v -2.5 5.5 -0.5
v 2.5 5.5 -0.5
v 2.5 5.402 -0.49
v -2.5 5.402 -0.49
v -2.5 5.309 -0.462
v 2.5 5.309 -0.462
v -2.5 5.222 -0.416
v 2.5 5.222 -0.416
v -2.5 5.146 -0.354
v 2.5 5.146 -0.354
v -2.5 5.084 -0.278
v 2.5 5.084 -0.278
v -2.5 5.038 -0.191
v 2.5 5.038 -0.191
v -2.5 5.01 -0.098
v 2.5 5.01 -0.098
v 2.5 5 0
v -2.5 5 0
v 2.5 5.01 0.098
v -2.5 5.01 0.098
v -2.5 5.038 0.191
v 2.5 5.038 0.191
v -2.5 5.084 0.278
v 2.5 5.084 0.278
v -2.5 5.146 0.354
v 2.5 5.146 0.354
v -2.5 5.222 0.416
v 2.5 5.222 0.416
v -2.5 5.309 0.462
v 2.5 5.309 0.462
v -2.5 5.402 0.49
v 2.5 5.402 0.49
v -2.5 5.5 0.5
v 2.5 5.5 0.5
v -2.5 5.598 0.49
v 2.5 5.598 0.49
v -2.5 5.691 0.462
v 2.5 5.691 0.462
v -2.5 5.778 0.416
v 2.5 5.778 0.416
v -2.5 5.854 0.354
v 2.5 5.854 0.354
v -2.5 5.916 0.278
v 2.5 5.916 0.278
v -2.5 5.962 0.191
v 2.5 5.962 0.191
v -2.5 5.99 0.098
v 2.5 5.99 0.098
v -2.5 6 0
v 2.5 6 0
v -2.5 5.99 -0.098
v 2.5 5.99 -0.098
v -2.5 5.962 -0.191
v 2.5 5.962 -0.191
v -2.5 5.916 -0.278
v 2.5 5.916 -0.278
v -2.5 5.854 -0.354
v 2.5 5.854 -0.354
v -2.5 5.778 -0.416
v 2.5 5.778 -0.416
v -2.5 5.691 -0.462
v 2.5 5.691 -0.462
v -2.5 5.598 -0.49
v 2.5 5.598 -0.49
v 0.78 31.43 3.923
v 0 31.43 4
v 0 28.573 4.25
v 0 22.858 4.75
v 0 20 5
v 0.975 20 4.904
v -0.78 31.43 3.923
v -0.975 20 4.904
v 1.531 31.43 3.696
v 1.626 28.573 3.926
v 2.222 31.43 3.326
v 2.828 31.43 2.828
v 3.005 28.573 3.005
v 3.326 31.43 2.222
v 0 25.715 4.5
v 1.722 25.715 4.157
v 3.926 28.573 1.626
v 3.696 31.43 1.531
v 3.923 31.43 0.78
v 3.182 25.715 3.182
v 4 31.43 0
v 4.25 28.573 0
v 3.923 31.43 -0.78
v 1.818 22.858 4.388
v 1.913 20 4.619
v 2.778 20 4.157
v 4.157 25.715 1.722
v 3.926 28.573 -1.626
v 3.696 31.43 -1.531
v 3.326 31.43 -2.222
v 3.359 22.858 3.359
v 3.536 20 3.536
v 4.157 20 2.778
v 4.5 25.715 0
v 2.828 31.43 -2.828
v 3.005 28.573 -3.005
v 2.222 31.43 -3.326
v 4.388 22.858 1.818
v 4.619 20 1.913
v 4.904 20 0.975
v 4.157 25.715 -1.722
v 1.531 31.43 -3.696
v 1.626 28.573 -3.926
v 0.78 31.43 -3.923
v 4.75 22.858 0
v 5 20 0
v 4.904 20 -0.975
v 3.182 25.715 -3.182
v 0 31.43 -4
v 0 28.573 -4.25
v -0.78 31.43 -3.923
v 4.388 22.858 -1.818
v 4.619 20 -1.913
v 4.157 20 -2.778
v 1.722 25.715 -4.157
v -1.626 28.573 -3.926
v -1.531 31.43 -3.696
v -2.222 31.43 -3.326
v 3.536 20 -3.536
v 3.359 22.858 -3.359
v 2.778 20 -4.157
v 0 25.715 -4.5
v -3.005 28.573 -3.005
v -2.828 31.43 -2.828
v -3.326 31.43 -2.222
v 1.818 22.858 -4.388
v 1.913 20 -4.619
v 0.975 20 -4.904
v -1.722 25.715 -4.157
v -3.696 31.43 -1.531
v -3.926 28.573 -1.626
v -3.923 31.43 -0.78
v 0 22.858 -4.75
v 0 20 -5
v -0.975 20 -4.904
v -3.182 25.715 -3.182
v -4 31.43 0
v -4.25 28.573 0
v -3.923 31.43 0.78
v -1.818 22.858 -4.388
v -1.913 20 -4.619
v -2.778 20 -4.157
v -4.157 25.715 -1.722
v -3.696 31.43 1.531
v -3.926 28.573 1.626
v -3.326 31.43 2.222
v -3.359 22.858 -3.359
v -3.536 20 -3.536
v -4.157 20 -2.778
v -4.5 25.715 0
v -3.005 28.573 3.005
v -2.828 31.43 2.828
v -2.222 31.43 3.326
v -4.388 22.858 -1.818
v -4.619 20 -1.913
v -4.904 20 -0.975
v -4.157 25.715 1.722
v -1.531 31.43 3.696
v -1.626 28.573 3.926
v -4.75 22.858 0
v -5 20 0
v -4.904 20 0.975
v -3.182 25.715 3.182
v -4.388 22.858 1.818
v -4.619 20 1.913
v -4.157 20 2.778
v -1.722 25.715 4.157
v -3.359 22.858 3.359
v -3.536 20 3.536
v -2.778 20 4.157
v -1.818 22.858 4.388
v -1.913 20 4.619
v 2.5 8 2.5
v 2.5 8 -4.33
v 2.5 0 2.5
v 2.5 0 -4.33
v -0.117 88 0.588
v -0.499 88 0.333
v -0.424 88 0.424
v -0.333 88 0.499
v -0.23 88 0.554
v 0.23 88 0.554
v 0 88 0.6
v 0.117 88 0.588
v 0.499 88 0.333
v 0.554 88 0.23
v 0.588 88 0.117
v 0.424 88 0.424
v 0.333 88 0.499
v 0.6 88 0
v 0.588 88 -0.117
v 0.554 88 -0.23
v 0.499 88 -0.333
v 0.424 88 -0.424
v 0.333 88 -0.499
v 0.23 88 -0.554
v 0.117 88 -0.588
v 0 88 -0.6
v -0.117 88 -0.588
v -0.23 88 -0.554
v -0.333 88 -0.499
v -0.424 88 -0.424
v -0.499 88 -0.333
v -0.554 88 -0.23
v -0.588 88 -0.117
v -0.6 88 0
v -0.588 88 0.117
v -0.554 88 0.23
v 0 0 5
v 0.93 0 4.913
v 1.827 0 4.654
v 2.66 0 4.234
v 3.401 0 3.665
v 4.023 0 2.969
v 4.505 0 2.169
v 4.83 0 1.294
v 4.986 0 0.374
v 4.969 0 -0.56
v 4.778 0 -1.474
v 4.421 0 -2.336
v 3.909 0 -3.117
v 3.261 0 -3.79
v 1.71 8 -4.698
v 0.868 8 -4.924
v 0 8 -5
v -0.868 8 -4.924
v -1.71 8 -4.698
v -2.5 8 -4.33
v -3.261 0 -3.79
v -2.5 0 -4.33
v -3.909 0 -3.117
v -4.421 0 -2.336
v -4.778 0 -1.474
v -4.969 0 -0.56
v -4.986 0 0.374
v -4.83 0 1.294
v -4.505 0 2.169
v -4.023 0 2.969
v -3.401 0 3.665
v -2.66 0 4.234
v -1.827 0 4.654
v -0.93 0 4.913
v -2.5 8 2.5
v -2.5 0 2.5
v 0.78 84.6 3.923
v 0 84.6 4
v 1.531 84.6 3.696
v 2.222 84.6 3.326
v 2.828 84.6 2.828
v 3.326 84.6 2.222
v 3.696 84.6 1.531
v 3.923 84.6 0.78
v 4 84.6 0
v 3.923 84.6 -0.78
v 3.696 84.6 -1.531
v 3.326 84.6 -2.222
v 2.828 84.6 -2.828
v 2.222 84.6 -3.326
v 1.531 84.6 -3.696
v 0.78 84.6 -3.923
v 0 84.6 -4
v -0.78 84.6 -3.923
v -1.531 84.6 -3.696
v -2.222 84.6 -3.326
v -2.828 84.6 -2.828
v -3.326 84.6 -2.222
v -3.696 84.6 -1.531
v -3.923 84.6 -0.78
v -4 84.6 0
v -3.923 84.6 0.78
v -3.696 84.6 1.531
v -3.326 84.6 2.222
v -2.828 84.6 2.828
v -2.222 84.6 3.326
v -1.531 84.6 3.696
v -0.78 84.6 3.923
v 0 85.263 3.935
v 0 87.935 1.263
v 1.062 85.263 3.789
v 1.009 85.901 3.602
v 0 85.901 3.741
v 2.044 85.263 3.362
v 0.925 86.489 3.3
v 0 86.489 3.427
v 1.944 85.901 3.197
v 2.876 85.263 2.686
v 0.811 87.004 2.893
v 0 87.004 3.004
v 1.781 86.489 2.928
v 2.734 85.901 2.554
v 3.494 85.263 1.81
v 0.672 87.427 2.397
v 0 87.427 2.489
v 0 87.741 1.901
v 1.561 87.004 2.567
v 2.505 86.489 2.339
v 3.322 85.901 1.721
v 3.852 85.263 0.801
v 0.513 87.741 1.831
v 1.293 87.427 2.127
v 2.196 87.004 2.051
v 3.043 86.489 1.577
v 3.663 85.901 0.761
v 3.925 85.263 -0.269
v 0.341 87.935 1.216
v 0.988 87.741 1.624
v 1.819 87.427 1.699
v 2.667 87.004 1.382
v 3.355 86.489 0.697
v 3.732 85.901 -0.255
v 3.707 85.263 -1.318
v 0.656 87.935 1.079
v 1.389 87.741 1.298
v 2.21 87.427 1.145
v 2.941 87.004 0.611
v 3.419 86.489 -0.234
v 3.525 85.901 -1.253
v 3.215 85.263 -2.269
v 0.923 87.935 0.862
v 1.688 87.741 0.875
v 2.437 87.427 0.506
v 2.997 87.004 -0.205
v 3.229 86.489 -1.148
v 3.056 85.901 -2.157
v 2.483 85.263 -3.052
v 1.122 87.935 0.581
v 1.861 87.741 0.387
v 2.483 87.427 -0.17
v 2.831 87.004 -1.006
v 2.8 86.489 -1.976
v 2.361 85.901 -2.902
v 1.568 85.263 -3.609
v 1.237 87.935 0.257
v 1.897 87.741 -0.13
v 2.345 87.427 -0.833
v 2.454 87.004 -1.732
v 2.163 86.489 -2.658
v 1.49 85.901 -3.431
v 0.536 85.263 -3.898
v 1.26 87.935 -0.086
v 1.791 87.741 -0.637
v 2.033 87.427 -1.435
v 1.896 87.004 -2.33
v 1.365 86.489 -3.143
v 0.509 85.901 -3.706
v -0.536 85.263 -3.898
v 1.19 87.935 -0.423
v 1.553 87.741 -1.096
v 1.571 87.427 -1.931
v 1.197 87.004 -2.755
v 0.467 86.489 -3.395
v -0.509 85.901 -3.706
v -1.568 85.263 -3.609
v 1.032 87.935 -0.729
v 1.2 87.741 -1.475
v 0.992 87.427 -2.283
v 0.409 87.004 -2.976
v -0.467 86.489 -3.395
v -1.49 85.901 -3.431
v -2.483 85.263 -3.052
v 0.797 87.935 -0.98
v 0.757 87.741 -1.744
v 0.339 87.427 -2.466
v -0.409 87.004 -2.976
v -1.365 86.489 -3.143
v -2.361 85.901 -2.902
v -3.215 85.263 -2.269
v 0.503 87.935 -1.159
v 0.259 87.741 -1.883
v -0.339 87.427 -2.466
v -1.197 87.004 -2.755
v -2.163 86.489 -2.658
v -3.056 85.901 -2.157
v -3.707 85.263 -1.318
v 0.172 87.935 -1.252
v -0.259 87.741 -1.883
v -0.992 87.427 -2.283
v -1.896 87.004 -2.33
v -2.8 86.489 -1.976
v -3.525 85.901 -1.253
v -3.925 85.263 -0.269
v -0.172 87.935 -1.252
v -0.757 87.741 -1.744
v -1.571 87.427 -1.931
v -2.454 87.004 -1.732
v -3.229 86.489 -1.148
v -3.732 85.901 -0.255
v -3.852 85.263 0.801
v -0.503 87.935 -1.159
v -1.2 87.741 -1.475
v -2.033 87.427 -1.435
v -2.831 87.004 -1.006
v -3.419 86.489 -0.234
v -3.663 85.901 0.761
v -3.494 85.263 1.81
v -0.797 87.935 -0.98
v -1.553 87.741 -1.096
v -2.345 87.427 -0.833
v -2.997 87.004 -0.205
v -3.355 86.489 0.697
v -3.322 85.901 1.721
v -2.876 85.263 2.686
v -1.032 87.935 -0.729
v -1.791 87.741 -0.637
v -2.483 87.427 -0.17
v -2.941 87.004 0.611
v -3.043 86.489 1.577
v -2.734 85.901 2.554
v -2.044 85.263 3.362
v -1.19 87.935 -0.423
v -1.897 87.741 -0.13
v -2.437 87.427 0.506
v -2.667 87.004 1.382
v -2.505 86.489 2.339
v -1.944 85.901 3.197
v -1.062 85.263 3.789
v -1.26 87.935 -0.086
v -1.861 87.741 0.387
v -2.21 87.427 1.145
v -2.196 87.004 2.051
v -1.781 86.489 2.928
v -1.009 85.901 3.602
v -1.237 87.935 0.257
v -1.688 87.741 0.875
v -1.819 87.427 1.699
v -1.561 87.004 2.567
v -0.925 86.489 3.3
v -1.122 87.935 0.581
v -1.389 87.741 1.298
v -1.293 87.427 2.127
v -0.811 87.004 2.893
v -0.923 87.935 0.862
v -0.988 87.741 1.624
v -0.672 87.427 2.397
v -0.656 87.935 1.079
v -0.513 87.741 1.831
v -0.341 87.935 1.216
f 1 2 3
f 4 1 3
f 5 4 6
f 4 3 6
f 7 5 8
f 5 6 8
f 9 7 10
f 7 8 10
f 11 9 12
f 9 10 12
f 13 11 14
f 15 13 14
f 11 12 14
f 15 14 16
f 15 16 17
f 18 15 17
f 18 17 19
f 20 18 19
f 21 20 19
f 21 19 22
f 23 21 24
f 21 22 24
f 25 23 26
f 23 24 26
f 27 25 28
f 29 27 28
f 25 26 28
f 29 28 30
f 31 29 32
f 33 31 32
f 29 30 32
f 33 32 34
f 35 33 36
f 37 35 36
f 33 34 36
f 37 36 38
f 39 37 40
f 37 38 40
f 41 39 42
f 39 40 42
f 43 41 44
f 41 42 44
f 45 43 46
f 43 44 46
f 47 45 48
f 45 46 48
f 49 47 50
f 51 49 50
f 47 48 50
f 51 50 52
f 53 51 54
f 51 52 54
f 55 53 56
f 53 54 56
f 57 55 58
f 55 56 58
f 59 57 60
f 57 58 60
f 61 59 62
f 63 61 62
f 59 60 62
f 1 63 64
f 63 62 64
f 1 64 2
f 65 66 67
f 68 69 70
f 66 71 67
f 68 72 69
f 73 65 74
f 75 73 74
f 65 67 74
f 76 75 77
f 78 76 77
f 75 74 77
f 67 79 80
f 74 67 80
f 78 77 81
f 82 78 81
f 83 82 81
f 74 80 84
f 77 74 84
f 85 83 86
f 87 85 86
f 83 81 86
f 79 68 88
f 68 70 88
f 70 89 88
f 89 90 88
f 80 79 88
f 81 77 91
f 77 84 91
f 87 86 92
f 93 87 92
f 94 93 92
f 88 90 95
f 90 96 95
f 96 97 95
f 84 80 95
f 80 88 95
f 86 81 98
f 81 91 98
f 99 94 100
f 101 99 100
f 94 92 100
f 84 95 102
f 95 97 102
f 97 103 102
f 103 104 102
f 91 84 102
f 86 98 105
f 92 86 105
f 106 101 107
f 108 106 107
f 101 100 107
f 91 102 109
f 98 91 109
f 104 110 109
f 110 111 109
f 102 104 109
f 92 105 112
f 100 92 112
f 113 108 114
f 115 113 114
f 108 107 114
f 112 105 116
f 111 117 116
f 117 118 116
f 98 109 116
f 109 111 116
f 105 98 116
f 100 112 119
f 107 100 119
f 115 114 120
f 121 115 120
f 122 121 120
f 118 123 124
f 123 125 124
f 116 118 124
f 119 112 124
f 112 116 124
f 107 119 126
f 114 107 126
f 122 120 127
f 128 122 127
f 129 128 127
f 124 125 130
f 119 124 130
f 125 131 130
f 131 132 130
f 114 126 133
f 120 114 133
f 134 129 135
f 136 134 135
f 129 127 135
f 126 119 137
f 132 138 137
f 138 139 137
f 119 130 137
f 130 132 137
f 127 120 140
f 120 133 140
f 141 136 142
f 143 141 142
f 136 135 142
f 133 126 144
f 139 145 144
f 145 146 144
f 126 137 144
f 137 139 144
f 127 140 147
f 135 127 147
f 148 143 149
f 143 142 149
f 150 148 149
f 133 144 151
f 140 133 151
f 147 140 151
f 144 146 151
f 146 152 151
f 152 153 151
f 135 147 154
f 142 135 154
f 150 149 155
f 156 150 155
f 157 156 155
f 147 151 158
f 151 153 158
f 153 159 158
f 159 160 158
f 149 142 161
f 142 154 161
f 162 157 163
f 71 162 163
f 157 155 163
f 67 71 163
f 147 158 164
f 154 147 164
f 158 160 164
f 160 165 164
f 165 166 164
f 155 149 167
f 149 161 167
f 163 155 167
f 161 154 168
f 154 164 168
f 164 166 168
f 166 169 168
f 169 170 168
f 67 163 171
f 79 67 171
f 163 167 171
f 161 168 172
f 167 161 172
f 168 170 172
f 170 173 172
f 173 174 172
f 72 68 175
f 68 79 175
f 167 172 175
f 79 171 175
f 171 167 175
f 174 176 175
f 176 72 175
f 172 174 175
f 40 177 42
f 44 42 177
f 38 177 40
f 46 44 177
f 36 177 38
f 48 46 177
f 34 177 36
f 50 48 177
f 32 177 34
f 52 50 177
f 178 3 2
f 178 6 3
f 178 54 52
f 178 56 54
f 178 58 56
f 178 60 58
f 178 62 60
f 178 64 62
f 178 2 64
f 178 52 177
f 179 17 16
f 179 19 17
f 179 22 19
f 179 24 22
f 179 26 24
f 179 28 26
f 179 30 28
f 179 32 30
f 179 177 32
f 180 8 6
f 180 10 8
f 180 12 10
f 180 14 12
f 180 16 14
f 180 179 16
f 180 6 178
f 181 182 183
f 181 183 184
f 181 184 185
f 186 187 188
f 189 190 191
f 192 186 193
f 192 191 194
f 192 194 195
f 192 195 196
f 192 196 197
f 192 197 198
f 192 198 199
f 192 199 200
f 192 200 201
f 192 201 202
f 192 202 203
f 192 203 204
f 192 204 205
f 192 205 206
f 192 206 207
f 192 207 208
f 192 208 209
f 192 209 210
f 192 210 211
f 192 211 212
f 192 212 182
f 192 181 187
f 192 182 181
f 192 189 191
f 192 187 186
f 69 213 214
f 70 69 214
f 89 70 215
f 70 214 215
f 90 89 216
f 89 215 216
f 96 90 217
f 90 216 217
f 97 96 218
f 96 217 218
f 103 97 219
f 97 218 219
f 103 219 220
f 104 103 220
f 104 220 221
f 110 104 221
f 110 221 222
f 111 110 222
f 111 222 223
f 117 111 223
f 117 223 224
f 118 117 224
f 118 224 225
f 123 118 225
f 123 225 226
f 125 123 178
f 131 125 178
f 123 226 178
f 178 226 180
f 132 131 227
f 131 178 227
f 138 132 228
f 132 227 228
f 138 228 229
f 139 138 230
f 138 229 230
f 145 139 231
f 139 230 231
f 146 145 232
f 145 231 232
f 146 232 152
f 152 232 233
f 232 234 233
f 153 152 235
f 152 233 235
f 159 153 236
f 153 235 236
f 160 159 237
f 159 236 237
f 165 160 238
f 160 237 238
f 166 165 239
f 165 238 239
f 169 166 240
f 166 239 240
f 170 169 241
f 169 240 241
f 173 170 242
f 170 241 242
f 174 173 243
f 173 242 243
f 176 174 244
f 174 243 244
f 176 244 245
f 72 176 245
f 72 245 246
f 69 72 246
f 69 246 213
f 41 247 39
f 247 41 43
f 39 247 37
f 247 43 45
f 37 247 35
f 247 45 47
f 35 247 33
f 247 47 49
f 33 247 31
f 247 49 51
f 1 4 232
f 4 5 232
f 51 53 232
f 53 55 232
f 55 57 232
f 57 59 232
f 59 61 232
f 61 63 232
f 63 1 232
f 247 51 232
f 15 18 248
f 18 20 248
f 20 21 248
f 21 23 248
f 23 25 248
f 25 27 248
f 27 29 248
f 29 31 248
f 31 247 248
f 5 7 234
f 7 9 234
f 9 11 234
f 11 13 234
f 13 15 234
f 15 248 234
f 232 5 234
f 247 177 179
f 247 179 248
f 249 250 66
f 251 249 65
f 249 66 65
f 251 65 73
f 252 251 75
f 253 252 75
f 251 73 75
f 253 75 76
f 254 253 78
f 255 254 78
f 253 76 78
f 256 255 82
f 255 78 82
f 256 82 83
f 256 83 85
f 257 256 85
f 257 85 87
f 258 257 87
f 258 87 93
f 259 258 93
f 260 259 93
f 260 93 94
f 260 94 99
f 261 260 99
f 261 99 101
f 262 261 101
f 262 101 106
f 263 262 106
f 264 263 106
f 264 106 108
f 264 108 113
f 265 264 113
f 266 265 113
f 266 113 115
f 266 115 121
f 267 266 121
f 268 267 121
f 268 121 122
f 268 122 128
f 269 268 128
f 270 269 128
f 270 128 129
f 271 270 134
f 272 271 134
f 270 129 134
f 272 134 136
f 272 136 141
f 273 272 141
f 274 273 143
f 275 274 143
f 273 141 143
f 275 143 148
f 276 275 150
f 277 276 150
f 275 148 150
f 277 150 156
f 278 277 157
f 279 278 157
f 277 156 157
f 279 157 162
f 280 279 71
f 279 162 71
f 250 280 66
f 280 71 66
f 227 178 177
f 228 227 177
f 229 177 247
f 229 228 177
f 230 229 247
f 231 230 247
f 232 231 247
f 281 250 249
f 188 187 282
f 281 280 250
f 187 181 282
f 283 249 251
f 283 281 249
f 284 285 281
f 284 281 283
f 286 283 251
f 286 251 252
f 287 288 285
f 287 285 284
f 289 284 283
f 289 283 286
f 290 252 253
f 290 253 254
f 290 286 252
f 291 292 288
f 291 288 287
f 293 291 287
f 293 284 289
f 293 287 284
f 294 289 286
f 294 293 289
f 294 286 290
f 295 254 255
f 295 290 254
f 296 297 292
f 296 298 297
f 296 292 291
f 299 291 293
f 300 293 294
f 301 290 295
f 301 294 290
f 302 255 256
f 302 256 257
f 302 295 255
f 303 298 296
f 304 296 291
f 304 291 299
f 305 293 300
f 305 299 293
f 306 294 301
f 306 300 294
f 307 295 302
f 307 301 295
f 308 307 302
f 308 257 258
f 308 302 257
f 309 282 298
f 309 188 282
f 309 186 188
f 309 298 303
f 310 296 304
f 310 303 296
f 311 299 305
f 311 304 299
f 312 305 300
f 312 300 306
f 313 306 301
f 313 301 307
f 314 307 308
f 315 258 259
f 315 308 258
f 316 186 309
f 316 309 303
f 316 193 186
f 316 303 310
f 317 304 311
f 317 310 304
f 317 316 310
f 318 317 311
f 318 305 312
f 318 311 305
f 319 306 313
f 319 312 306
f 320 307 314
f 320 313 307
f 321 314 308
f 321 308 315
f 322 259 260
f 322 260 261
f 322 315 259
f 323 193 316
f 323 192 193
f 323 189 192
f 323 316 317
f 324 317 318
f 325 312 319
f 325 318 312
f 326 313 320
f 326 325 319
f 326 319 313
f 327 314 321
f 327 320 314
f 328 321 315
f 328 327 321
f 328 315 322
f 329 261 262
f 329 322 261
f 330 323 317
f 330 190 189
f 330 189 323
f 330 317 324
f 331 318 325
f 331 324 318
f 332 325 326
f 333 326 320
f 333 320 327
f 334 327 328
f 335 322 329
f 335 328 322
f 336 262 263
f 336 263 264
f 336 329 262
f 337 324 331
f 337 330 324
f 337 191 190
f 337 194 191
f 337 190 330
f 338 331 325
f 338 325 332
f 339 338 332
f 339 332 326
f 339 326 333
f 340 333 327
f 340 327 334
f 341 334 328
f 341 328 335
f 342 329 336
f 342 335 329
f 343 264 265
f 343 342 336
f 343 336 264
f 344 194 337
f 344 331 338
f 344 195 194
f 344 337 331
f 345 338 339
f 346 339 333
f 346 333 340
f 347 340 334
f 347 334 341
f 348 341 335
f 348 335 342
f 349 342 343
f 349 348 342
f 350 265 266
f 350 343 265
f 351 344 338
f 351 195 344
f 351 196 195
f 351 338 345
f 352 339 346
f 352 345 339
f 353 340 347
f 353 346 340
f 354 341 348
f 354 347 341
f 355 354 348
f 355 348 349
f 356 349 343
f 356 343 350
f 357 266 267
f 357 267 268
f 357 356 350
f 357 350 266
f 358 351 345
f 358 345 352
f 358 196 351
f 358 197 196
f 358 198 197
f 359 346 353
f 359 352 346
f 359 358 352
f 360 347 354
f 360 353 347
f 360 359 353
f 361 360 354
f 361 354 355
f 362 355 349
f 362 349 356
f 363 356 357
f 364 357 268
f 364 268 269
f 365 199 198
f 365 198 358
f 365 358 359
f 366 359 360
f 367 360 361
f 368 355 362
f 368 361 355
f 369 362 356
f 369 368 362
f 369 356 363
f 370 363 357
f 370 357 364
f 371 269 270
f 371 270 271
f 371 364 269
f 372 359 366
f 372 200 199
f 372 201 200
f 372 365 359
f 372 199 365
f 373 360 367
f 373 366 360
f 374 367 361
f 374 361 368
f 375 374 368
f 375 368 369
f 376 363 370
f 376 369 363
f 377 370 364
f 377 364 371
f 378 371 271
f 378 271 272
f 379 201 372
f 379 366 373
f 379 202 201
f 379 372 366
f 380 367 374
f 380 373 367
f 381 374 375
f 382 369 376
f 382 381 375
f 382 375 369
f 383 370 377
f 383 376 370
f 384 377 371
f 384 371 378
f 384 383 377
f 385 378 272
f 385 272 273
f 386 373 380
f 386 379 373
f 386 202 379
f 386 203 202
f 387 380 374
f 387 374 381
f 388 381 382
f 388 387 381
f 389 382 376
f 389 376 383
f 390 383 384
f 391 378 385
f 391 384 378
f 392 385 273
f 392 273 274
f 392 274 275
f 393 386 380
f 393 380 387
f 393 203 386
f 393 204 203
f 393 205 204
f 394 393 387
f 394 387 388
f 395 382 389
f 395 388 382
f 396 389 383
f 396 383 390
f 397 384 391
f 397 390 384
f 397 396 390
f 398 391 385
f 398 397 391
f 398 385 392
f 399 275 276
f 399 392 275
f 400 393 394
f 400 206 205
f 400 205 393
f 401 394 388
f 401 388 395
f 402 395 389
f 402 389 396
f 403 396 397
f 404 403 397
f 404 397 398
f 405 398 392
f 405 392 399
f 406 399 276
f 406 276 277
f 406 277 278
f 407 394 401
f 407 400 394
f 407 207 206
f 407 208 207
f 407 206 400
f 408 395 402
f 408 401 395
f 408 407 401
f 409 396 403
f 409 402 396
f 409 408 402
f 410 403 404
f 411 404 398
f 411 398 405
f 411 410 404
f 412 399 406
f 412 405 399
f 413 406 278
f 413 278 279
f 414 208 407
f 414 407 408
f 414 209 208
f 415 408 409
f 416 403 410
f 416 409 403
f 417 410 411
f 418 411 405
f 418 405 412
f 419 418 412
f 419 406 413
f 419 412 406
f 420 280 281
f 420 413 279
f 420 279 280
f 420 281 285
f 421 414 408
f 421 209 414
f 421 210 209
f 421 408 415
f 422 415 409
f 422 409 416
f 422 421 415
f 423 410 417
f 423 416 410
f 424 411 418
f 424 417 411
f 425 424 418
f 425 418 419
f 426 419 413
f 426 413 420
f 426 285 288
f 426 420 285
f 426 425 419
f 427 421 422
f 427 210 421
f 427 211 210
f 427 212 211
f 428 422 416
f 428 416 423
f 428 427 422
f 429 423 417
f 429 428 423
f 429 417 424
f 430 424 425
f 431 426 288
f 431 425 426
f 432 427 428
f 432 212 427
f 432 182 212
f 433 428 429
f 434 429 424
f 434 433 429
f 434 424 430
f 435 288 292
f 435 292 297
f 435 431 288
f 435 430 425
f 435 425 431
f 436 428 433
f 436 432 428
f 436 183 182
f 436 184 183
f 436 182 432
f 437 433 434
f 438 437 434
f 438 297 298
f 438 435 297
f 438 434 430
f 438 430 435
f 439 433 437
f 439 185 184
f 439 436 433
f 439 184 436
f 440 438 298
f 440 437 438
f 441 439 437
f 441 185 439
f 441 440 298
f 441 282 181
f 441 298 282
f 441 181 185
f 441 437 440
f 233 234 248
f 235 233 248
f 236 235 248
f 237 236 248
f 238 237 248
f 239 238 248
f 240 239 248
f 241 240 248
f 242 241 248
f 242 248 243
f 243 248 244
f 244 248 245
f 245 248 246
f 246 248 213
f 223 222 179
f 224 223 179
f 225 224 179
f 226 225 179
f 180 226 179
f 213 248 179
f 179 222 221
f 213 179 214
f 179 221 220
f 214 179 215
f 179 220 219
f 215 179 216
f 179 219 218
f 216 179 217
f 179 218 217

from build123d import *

# Parameters (mm, degrees)
SKETCH1_R           = 5
BOSS_EXTRUDE1_DEPTH = 20
SKETCH2_R           = 4
BOSS_EXTRUDE2_DEPTH = 68
FILLET1_R           = 3.4
CHAMFER1_SIZE       = 11.430052303
CHAMFER1_SIZE_2     = 1
SKETCH3_W           = 5
SKETCH3_H           = 5
CUT_EXTRUDE1_DEPTH  = 8
SKETCH4_W           = 5
SKETCH4_H           = 2.702388579
CUT_EXTRUDE2_DEPTH  = 8
SKETCH5_R           = 0.5
BOSS_EXTRUDE3_DEPTH = 5


with BuildPart() as part:
    # Sketch1 → Boss-Extrude1 (new body)
    with BuildSketch(Plane(origin=(0, 0, 0), x_dir=(1, 0, 0), z_dir=(0, 1, 0))):
        with Locations(Location((0, 0, 0), (0, 0, 270))):
            Circle(SKETCH1_R)
    extrude(amount=BOSS_EXTRUDE1_DEPTH)

    # Sketch2 → Boss-Extrude2 (add)
    with BuildSketch(Plane(origin=(0, 20, 0), x_dir=(1, 0, 0), z_dir=(0, 1, 0))):
        with Locations(Location((0, 0, 0), (0, 0, 270))):
            Circle(SKETCH2_R)
    extrude(amount=BOSS_EXTRUDE2_DEPTH)

    # Fillet1
    fillet1_edges = [part.edges().sort_by_distance(p)[0] for p in [
        (0, 88, -4),
    ]]
    fillet(fillet1_edges, radius=FILLET1_R)

    # Chamfer1
    # the kernel refuses this chamfer: 11.430052303, 1 mm, written as the material it adds along each edge
    with BuildSketch(Plane(origin=(0, 20, 0), x_dir=(0, 0, 1), z_dir=(-1, 0, 0))) as chamfer1_piece_1_section:
        Polygon((4, CHAMFER1_SIZE), (4 + CHAMFER1_SIZE_2, 0), (4, 0), align=None)
    chamfer1_piece_1 = revolve(axis=Axis((0, 20, 0), (0, 1, 0)), mode=Mode.PRIVATE)
    chamfer1_piece_1 = chamfer1_piece_1 & Plane(origin=(0, 25.937398898, 0), x_dir=(0, 0, 1), z_dir=(0, -1, 0)) * Cylinder(5, 46, mode=Mode.PRIVATE)
    add(chamfer1_piece_1)

    # Sketch3 → Cut-Extrude1 (cut)
    with BuildSketch(Plane(origin=(0, 0, 0), x_dir=(-1, 0, 0), z_dir=(0, -1, 0))):
        Rectangle(SKETCH3_W, SKETCH3_H)
    extrude(amount=-CUT_EXTRUDE1_DEPTH, mode=Mode.SUBTRACT)

    # Sketch4 → Cut-Extrude2 (cut)
    with BuildSketch(Plane(origin=(0, 0, 0), x_dir=(-1, 0, 0), z_dir=(0, -1, 0))):
        with Locations((0, 3.851194289)):
            Rectangle(SKETCH4_W, SKETCH4_H)
    extrude(amount=-CUT_EXTRUDE2_DEPTH, mode=Mode.SUBTRACT)

    # Sketch5 → Boss-Extrude3 (add)
    with BuildSketch(Plane.ZY.offset(-2.5)):
        with Locations(Location((0, 5.5, 0), (0, 0, 180))):
            Circle(SKETCH5_R)
    extrude(amount=BOSS_EXTRUDE3_DEPTH)


solid = part.part
